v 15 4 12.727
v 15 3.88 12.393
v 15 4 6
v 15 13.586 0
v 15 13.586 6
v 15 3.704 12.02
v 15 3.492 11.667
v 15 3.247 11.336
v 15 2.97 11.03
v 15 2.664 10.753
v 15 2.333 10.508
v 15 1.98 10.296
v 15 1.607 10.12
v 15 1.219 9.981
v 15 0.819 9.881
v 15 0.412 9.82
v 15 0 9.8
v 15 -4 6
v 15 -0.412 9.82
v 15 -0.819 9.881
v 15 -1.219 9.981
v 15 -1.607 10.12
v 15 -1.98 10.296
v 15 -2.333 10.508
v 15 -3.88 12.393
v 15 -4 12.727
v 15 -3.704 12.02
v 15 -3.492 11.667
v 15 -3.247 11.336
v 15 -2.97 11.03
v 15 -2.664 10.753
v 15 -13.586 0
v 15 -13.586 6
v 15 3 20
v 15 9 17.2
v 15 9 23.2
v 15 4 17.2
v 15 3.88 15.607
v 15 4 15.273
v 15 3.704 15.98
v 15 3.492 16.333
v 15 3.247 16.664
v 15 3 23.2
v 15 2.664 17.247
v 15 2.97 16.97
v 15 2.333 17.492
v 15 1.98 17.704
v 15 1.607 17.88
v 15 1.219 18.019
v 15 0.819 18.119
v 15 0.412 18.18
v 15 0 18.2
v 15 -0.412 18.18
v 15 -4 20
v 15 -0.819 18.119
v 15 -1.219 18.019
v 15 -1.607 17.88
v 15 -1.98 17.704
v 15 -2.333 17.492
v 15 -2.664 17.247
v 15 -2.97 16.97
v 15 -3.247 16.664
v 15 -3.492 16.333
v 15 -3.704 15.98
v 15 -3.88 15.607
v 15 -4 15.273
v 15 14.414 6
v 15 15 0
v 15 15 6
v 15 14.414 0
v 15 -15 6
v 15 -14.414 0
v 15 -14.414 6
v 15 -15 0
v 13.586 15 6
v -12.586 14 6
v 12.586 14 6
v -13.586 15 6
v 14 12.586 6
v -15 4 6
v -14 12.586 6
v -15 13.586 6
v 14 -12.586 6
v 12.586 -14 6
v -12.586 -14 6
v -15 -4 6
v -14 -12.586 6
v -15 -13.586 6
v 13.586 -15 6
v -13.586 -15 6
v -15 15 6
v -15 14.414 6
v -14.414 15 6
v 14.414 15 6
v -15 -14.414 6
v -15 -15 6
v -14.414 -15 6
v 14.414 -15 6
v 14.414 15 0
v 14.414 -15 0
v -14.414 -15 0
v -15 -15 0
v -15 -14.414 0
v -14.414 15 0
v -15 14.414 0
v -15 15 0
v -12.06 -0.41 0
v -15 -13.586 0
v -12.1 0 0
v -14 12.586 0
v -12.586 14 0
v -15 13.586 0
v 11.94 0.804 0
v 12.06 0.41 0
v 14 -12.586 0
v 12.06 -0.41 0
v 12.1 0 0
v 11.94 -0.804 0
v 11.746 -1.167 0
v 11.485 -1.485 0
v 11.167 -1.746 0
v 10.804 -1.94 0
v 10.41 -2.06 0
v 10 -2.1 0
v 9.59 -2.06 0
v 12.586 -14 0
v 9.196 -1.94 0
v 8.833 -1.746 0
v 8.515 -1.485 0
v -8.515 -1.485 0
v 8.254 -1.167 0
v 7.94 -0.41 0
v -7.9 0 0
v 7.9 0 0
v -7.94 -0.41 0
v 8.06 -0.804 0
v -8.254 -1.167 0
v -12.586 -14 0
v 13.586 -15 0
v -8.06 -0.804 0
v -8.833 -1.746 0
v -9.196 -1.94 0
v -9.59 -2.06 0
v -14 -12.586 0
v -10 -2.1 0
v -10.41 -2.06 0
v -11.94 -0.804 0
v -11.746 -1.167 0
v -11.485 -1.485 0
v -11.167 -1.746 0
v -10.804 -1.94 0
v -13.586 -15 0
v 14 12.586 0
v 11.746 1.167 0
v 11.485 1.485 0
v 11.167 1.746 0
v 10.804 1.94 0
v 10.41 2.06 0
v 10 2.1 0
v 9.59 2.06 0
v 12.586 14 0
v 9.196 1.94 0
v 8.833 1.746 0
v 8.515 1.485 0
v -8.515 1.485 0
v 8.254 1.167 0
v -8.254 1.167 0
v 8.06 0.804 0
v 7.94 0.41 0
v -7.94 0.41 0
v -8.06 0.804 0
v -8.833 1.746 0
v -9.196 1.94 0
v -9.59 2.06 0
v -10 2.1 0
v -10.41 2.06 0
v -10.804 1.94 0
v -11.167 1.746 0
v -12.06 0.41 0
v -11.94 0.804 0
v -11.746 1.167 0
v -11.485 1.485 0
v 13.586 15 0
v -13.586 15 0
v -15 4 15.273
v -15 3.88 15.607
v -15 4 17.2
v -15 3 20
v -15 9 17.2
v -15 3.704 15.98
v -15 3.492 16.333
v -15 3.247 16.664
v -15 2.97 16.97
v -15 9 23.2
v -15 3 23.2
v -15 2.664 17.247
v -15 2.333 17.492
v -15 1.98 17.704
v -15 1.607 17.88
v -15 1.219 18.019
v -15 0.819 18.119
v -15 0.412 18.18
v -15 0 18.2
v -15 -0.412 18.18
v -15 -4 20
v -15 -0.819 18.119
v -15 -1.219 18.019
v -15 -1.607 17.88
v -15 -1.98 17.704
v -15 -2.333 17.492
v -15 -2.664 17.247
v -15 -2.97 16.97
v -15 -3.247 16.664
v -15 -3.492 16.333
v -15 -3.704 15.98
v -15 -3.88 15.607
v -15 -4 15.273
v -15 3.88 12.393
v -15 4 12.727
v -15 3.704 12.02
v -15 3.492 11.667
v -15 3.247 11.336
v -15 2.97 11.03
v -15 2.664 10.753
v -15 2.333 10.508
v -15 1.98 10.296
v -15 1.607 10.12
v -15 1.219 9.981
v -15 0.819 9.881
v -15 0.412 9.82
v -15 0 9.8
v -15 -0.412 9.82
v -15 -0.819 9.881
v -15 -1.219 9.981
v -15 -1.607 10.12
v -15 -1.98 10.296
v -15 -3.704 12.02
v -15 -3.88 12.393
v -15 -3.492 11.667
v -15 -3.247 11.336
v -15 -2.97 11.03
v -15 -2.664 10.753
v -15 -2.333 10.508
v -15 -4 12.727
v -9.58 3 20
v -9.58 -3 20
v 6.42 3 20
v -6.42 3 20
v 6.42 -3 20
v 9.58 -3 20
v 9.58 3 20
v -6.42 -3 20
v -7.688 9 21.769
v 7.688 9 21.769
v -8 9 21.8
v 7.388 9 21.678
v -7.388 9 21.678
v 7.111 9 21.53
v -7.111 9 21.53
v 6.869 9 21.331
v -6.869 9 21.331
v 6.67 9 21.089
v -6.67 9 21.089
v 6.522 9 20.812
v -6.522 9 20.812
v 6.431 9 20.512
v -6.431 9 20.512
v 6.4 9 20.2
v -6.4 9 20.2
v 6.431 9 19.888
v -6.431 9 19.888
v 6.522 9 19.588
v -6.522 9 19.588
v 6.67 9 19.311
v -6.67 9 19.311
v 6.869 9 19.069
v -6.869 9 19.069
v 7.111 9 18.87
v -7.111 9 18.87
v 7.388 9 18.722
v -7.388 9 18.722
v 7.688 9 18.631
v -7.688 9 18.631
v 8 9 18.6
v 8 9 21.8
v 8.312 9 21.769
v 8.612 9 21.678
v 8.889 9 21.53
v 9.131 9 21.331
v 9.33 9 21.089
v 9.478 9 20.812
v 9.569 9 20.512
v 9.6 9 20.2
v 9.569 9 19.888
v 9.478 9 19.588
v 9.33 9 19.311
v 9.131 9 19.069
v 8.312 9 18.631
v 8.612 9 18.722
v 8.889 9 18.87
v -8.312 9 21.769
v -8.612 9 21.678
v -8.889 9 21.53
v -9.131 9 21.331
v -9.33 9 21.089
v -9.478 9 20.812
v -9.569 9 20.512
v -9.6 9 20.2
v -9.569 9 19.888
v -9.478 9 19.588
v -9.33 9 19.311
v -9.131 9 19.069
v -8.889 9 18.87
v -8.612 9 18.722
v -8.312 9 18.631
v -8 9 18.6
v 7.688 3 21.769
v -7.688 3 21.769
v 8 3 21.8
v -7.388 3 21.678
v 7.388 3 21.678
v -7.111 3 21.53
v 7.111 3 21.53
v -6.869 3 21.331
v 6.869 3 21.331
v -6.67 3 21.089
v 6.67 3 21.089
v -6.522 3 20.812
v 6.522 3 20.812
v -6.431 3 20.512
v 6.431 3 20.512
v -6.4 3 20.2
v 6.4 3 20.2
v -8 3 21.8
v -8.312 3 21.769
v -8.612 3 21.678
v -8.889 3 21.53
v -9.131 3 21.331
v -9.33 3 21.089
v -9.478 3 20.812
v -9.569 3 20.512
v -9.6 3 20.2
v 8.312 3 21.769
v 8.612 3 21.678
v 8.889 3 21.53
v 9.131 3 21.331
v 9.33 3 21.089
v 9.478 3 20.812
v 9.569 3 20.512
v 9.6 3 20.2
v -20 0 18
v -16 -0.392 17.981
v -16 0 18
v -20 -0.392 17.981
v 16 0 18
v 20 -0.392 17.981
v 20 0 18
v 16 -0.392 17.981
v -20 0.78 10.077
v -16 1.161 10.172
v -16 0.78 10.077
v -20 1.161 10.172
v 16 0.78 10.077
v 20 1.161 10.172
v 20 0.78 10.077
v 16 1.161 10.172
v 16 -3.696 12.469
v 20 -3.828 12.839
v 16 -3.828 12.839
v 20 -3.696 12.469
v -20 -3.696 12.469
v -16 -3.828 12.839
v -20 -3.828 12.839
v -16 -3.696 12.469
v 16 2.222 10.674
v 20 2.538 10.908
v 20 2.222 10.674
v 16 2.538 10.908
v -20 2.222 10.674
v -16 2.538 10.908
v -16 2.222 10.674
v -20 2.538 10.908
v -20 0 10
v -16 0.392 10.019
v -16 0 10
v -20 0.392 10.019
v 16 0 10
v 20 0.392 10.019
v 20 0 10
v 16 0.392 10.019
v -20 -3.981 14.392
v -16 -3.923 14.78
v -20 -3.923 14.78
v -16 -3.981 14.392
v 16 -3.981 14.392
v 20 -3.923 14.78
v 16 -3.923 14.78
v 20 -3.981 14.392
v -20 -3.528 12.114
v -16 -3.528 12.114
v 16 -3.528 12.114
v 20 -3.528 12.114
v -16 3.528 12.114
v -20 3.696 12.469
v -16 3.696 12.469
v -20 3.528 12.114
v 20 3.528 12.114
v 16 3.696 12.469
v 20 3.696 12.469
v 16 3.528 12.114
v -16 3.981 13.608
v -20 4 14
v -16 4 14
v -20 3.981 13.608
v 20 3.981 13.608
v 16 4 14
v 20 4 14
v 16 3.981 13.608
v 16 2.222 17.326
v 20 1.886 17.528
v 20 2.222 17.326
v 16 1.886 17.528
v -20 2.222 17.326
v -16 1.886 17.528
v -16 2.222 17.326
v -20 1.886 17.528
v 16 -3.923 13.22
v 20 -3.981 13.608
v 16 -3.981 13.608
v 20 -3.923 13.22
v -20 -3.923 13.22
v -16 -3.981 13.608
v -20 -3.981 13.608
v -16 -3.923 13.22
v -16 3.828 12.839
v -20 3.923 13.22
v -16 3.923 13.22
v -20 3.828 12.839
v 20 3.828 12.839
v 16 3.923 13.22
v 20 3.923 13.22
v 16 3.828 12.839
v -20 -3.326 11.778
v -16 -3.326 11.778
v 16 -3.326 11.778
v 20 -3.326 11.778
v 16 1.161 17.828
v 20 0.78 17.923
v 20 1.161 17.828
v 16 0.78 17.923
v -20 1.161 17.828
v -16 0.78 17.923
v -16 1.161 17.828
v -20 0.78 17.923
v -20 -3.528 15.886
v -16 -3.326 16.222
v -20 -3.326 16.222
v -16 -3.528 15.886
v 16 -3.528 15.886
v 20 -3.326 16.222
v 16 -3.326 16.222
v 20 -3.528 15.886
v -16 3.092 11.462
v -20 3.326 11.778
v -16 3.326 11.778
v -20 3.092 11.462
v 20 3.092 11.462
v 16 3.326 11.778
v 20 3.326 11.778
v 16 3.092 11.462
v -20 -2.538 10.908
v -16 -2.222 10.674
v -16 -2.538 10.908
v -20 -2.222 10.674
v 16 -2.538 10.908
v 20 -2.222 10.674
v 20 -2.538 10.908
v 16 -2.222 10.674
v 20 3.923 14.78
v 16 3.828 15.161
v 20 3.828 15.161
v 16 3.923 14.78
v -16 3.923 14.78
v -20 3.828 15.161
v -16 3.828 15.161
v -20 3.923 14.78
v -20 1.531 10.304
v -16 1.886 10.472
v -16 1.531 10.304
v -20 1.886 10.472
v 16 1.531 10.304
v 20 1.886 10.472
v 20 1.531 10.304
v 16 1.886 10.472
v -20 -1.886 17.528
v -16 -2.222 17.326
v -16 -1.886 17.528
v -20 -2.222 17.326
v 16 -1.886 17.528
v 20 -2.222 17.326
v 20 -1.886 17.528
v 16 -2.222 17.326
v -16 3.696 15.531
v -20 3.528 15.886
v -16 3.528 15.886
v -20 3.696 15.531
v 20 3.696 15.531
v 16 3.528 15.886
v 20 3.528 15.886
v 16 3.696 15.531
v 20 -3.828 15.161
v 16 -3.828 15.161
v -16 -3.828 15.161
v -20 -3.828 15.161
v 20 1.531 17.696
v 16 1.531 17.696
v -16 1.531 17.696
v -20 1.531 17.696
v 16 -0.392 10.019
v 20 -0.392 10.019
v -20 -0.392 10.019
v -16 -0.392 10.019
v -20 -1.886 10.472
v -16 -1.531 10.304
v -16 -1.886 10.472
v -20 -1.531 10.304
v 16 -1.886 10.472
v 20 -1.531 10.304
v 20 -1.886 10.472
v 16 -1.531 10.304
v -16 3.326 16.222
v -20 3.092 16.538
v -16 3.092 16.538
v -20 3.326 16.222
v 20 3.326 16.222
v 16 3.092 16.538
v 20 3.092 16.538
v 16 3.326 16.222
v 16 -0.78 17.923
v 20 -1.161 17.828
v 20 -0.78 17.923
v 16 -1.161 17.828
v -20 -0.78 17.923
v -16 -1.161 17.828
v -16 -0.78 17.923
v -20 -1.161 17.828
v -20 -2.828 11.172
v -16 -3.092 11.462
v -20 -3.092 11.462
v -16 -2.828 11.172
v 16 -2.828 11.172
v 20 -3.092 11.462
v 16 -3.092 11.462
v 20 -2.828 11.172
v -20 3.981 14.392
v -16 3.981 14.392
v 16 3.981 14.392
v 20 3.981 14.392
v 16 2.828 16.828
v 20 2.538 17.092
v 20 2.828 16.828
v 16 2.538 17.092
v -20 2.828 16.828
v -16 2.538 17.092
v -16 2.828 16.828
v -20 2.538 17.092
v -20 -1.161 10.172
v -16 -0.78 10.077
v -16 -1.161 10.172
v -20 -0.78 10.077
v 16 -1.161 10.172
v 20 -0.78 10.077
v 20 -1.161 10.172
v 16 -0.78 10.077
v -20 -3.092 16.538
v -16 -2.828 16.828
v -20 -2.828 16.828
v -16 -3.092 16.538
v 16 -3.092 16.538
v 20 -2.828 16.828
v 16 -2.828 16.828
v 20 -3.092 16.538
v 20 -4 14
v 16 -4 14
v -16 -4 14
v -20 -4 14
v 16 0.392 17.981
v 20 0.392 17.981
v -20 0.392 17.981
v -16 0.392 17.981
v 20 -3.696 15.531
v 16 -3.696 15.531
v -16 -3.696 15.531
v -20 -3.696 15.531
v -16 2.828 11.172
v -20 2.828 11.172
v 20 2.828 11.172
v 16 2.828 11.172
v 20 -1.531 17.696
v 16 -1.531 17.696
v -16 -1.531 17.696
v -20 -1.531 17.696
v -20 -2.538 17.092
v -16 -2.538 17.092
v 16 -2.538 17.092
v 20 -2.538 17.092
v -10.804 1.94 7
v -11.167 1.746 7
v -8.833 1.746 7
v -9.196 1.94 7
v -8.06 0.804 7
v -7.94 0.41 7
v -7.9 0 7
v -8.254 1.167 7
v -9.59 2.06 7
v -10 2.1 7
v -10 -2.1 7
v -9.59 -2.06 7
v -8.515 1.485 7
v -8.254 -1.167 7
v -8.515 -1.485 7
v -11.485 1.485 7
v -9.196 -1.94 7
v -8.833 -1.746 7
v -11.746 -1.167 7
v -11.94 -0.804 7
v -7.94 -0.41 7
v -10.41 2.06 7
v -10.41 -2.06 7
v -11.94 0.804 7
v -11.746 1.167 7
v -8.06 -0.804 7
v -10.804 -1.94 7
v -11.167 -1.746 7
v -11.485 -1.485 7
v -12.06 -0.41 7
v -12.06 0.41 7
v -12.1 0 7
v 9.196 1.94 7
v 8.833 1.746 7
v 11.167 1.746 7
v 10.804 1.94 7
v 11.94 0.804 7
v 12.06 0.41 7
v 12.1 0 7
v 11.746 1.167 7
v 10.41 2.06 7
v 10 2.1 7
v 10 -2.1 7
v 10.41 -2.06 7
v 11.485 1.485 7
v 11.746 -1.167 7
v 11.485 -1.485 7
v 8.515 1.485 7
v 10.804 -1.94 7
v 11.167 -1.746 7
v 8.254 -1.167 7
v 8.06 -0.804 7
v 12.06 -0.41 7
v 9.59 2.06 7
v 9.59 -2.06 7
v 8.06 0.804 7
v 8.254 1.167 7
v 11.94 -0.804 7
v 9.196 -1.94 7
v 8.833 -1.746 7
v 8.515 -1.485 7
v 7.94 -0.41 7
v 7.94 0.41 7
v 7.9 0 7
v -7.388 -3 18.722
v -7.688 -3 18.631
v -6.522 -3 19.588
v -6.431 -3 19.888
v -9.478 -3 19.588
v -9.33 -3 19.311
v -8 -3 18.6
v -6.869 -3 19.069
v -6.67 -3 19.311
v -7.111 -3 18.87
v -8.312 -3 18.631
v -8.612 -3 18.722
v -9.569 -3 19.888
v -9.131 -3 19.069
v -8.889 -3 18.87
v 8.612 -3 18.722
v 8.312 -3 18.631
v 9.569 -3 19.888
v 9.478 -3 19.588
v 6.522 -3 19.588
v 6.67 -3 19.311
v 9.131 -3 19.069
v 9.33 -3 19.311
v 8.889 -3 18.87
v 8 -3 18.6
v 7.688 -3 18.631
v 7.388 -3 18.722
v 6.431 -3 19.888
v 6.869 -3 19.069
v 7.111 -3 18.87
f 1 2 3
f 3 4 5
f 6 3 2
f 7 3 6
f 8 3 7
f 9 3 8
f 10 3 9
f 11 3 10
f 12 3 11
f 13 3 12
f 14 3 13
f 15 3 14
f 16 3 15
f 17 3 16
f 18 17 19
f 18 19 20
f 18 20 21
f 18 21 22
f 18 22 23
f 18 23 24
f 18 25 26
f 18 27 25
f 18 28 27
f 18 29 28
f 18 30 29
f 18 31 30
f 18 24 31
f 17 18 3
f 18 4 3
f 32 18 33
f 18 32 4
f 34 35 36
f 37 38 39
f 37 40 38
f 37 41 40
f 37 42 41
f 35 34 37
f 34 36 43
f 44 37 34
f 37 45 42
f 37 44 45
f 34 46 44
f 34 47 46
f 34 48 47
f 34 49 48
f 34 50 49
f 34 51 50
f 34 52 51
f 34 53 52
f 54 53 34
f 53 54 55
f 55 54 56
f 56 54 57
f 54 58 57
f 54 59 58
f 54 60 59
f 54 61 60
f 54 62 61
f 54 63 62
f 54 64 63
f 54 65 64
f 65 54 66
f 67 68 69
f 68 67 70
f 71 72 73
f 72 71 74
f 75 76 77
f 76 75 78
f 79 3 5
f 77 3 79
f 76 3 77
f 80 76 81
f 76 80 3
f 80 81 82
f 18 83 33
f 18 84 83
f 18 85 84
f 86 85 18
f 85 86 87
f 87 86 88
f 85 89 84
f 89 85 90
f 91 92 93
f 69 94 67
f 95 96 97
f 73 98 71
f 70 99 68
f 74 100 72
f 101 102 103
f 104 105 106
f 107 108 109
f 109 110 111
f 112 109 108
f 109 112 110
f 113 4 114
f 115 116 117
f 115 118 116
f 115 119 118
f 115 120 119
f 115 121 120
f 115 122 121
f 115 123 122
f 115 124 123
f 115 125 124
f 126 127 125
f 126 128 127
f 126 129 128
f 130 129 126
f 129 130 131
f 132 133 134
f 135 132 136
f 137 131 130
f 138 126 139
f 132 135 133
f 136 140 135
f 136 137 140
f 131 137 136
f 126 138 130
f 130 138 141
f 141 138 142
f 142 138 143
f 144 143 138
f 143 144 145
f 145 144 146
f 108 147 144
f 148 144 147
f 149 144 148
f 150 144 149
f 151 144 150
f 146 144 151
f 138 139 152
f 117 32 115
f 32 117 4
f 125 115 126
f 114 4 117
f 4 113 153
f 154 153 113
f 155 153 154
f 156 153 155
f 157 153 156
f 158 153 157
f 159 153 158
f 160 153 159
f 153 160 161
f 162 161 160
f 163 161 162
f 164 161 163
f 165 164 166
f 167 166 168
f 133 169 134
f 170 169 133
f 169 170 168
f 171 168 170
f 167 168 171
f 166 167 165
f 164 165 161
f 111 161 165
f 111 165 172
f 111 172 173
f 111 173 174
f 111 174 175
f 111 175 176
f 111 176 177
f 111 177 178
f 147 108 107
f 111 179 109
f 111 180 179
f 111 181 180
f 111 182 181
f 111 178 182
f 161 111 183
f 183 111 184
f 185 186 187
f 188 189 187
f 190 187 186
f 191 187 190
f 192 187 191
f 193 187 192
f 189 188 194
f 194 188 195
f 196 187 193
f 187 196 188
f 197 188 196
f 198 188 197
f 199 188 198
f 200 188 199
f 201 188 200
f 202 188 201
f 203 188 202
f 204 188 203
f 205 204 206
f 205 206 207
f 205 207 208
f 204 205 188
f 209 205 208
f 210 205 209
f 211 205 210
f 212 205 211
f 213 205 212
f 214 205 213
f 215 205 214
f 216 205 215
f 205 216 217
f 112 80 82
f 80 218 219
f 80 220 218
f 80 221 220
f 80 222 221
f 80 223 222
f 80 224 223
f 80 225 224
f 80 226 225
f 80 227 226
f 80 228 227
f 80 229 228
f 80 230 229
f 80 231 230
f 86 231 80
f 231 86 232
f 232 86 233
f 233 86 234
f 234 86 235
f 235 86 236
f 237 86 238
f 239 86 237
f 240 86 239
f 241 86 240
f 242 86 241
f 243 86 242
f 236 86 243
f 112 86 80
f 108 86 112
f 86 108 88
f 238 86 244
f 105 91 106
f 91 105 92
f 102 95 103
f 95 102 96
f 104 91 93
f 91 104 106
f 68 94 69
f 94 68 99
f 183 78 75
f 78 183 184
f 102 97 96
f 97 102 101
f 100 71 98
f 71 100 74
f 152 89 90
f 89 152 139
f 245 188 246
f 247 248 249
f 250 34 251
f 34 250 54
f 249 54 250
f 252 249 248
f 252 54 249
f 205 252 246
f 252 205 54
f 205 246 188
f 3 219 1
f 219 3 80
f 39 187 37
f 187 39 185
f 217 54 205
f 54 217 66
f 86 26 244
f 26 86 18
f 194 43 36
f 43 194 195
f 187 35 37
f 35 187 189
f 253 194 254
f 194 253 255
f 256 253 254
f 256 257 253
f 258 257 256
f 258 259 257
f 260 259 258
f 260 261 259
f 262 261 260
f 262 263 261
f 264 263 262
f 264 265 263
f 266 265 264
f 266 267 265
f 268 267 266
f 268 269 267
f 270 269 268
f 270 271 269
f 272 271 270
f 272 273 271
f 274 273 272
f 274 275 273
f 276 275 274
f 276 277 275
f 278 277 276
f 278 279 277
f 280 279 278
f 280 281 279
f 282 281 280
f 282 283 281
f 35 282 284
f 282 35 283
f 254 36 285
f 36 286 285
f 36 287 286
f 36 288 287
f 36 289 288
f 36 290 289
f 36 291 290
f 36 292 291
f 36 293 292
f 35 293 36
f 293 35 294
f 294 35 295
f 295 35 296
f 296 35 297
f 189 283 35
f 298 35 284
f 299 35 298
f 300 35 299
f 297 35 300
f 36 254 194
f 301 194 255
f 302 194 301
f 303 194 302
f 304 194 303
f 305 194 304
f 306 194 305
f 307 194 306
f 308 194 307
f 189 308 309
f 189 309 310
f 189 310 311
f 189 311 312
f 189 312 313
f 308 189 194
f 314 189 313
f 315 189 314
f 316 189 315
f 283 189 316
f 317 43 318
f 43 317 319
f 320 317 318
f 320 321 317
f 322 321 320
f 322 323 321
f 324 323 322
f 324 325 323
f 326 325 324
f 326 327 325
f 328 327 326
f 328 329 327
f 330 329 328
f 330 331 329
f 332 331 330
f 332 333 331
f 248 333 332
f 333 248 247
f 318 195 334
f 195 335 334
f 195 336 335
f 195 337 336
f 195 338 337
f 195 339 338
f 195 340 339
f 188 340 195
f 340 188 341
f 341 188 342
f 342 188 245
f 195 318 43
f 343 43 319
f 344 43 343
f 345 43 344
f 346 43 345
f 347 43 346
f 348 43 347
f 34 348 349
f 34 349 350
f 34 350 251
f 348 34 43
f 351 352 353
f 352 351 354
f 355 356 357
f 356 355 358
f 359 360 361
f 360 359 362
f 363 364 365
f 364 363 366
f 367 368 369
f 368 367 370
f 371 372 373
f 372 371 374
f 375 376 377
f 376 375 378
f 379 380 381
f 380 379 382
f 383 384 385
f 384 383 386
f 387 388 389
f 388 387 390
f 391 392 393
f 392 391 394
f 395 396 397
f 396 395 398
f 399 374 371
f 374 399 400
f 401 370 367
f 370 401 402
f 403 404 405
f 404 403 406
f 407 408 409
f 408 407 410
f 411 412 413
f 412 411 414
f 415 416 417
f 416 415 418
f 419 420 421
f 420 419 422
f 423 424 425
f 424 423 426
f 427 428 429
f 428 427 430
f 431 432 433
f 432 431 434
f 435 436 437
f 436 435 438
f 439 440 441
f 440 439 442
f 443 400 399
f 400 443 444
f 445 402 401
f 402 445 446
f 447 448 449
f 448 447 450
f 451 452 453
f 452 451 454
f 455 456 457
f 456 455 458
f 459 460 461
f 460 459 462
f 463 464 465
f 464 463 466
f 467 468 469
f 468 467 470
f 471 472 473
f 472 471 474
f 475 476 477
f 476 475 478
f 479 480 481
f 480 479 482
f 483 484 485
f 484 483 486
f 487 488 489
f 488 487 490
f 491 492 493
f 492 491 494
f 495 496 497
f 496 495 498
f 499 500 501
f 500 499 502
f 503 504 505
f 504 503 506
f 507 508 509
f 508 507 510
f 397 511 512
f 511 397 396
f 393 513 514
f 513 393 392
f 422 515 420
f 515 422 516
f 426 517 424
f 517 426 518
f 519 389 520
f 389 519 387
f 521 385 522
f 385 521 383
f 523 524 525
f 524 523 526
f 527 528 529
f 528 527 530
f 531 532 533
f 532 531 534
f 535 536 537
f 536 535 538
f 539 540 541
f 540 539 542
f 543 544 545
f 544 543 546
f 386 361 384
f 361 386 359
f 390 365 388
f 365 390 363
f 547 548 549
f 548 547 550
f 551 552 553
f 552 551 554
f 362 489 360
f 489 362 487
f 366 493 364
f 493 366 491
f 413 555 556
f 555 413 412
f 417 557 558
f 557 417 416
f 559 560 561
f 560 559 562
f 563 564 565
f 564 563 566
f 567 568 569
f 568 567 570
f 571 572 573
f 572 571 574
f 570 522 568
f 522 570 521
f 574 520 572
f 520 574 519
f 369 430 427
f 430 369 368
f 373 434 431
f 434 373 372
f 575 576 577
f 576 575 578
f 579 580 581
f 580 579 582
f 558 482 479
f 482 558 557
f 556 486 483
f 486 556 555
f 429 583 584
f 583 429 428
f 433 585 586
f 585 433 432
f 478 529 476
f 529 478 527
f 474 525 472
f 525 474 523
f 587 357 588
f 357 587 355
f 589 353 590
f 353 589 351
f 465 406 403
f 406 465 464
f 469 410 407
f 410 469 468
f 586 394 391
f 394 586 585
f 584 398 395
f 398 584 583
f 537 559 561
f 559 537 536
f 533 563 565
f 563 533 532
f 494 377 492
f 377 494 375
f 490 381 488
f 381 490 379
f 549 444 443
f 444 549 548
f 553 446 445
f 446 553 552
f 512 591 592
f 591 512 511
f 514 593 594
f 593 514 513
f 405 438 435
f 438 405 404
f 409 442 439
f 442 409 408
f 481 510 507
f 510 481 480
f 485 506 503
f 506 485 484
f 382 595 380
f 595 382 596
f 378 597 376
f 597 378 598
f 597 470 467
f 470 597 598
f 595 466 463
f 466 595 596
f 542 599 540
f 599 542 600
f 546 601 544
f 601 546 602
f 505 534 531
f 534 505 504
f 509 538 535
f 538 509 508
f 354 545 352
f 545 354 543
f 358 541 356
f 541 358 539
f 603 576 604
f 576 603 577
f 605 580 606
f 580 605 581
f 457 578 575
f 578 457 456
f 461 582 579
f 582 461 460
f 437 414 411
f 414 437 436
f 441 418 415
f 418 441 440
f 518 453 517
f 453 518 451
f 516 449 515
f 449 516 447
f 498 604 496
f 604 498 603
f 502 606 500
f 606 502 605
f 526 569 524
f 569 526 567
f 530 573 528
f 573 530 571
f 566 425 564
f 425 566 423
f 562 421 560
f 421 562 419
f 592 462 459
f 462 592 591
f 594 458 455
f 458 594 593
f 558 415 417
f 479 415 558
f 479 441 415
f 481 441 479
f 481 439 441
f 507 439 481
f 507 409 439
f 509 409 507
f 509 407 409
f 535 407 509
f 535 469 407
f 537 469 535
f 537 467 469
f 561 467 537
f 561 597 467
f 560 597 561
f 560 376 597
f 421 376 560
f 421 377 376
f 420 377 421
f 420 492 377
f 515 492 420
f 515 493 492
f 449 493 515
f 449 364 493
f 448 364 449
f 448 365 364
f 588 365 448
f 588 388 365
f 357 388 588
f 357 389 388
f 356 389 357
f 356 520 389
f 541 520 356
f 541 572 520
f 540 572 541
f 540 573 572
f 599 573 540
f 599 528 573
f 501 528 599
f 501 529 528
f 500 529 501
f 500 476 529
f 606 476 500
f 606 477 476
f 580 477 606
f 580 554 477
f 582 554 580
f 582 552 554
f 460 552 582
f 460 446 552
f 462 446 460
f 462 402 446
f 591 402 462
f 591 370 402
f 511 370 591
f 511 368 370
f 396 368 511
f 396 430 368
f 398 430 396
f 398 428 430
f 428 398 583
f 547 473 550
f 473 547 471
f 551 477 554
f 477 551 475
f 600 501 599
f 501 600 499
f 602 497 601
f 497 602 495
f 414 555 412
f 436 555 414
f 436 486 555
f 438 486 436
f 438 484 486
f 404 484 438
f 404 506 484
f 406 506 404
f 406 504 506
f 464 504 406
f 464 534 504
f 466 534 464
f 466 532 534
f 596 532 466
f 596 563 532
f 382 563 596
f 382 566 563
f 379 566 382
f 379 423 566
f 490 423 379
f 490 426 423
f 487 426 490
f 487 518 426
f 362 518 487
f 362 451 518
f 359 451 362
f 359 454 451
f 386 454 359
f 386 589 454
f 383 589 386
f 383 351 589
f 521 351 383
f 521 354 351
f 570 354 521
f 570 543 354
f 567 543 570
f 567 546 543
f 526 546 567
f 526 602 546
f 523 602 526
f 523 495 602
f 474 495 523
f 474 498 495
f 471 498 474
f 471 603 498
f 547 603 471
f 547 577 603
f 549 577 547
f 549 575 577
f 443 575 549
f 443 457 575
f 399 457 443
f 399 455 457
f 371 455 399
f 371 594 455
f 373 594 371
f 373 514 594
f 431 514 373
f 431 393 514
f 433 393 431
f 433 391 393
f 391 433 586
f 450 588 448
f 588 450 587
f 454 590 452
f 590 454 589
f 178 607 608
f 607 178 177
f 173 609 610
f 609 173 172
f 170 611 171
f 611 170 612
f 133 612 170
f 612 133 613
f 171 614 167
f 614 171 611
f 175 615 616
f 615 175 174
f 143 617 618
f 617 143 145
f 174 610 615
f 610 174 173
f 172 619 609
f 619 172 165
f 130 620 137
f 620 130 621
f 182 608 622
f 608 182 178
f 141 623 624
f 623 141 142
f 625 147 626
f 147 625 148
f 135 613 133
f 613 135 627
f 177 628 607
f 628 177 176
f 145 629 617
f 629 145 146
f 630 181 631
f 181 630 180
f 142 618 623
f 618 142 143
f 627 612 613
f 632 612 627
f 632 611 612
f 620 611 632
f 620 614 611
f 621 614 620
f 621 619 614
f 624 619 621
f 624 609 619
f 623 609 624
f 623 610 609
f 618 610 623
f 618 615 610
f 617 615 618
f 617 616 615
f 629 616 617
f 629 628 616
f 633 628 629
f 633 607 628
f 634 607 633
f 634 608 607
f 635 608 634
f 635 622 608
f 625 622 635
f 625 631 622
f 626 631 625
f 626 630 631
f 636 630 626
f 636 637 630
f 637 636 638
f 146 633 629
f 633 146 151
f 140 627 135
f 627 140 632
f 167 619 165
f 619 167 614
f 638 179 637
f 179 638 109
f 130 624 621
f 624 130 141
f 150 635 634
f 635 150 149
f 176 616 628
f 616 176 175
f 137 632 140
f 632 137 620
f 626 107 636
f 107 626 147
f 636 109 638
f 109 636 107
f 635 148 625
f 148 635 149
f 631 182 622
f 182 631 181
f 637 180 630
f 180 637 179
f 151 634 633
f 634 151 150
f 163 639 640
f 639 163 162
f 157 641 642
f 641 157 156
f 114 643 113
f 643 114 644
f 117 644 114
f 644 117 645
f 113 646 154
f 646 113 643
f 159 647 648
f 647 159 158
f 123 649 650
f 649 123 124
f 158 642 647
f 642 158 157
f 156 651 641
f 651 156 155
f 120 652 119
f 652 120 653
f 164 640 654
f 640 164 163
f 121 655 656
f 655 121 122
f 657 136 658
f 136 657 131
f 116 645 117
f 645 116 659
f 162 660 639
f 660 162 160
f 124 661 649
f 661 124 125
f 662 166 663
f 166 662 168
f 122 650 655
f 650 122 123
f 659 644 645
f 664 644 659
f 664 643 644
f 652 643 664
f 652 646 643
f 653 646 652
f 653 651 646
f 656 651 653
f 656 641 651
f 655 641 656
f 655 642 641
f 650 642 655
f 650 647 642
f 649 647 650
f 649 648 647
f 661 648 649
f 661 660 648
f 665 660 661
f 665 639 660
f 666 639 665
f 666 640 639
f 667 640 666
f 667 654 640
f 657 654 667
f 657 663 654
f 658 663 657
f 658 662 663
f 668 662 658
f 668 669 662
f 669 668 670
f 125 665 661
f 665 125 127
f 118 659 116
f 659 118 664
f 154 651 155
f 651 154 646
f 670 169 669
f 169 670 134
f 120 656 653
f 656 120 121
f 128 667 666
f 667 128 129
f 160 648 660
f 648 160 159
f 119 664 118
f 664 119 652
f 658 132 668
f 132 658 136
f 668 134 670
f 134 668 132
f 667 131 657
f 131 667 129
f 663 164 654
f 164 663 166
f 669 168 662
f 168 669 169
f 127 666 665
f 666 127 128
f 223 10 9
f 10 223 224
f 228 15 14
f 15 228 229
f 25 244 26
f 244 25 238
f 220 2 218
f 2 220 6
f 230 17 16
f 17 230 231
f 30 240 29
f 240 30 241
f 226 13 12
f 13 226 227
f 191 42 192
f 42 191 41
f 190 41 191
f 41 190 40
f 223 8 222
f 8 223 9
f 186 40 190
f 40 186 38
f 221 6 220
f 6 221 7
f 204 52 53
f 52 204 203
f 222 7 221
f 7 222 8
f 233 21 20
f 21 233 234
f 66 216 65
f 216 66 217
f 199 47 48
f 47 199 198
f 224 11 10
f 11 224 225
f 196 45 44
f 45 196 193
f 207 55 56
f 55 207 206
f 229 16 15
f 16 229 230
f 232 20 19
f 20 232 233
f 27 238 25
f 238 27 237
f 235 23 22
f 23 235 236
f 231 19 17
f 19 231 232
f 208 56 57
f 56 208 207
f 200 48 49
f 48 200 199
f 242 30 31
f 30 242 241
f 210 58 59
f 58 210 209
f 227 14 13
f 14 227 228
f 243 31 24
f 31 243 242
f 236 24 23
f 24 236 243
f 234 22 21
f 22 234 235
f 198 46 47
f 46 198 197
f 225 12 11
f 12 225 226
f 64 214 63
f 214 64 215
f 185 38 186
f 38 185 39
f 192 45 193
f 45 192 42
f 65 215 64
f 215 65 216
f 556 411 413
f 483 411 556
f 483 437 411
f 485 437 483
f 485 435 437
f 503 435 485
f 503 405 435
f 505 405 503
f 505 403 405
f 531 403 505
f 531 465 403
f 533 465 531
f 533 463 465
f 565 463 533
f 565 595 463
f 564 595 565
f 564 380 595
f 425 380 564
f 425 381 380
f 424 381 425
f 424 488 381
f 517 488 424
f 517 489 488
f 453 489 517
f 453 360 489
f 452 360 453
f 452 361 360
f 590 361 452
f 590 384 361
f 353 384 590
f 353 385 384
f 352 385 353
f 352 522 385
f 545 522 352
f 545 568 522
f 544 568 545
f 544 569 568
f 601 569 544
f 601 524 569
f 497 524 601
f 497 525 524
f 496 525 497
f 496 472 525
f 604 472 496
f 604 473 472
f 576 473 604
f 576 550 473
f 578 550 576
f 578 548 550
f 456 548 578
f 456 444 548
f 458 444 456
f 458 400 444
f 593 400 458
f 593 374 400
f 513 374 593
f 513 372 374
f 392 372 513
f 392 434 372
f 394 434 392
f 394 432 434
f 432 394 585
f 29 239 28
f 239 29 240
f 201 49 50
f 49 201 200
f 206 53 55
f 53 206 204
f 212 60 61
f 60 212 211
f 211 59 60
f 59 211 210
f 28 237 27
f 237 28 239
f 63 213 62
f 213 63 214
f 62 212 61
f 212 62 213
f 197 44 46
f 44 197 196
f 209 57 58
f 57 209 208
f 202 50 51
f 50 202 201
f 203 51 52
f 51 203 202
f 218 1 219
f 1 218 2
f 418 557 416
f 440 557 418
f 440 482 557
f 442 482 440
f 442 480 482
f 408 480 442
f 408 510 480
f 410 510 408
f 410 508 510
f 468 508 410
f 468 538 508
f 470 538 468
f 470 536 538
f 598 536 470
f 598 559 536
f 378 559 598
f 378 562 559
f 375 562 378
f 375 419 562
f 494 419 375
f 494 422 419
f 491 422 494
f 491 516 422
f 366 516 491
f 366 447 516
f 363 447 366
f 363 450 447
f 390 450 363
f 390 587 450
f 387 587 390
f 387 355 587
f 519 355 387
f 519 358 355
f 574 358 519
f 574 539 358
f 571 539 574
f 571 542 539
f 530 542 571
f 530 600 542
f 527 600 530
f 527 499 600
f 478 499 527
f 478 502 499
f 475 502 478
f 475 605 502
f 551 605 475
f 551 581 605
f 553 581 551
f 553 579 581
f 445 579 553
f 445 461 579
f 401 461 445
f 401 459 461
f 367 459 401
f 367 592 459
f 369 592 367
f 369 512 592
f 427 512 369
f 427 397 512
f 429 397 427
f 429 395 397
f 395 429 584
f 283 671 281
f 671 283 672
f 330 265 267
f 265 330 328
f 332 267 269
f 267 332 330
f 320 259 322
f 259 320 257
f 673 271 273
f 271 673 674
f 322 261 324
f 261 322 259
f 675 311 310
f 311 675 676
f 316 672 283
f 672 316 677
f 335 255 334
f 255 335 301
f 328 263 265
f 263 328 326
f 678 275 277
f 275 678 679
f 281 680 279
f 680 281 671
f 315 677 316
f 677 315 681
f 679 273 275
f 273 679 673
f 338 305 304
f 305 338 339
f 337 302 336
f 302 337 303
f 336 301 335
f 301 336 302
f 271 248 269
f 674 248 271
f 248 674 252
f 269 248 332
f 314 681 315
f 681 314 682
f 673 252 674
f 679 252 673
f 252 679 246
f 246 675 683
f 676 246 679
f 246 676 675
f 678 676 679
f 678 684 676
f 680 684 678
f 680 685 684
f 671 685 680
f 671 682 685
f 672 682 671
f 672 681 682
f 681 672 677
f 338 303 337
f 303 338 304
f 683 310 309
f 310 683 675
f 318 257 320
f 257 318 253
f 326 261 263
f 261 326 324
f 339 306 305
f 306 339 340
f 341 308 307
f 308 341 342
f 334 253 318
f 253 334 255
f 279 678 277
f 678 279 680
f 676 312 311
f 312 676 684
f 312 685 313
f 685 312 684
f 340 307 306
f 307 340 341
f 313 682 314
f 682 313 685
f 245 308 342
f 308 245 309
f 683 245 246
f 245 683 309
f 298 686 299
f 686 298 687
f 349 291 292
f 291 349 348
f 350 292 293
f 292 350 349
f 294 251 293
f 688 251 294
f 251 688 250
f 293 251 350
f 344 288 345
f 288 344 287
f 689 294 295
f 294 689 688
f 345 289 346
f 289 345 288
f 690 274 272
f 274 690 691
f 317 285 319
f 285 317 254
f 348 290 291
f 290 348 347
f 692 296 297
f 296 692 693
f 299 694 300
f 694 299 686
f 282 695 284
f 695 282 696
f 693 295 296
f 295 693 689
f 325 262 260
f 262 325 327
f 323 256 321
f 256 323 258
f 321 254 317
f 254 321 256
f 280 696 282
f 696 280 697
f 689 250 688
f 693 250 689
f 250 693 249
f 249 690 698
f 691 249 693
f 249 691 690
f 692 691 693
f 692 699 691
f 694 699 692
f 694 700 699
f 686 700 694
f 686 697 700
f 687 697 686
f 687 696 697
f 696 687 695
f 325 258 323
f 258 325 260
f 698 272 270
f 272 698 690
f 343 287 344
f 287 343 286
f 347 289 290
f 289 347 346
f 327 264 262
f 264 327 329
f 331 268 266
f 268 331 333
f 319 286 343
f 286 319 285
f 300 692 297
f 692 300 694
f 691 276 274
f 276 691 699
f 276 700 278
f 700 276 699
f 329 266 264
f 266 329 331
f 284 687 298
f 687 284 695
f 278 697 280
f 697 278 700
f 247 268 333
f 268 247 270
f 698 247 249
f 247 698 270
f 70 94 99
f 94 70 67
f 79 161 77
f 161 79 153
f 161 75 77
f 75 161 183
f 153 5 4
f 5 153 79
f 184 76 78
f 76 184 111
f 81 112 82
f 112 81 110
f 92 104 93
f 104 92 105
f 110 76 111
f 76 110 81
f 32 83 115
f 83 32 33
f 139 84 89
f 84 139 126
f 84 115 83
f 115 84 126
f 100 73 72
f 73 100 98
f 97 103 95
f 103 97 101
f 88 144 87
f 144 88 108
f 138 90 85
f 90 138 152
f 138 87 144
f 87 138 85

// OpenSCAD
// Parameters
rod_diameter = 8.0; //[4.0:16.0:0.1]
overall_height = 20.0; //[10.0:40.0:0.5]
base_width = 30.0; //[15.0:60.0:0.5]
base_length = 30.0; //[15.0:60.0:0.5]
base_thickness = 6.0; //[3.0:12.0:0.2]
upright_thickness = 8.0; //[4.0:16.0:0.2]
rod_center_height = 14.0; //[8.0:30.0:0.2]
rod_clearance = 0.2; //[0.0:0.6:0.05]
mount_hole_diameter = 4.2; //[3.0:6.5:0.1]
mount_hole_spacing = 20.0; //[12.0:40.0:0.5]
clamp_screw_diameter = 3.2; //[2.5:5.0:0.1]
clamp_screw_spacing = 16.0; //[10.0:30.0:0.5]
edge_chamfer = 1.0; //[0.0:3.0:0.1]
overlap = 1.0; //[0.5:2.0:0.1]
clamp_cap_thickness = 6.0; //[3.0:12.0:0.2]
clamp_cap_height = 6.0; //[3.0:12.0:0.2]
rod_length = 40.0; //[20.0:120.0:1]
rod_web_thickness = 0.8; //[0.4:2.0:0.1]

// Rod - complete geometry
module rod() {
  color("Silver") {
    cylinder(r=rod_diameter/2, h=rod_length, center=true, $fn=64);
  }
}

// Bracket - complete geometry
module bracket() {
  color("Silver") difference() {
    union() {
      // Base block
      translate([0, 0, base_thickness/2])
        cube([base_width, base_length, base_thickness], center=true);
      
      // Support upright
      translate([0, 0, base_thickness + (overall_height - base_thickness)/2])
        cube([base_width, upright_thickness, overall_height - base_thickness], center=true);
      
      // Clamp cap or retainer
      translate([0, (upright_thickness/2 + clamp_cap_thickness/2 - overlap), 
                 rod_center_height + (rod_diameter + 2*rod_clearance)/2 + clamp_cap_height/2 - overlap])
        cube([base_width, clamp_cap_thickness, clamp_cap_height], center=true);
      
      // Rod connect web
      translate([0, 0, rod_center_height - (rod_diameter/4)])
        cube([rod_web_thickness, upright_thickness, (rod_diameter/2) + overlap], center=true);
      
      // Rod
      translate([0, 0, rod_center_height])
        rotate([0, 90, 0]) rod();
    }
    
    // Mounting holes
    translate([-mount_hole_spacing/2, 0, base_thickness/2])
      cylinder(r=mount_hole_diameter/2, h=base_thickness + 2*overlap, center=true, $fn=32);
    translate([mount_hole_spacing/2, 0, base_thickness/2])
      cylinder(r=mount_hole_diameter/2, h=base_thickness + 2*overlap, center=true, $fn=32);
    
    // Rod saddle bore
    translate([0, 0, rod_center_height])
      rotate([0, 90, 0])
      cylinder(r=(rod_diameter + 2*rod_clearance)/2, h=base_width + 2*overlap, center=true, $fn=64);
    
    // Fastener clearance holes
    translate([-clamp_screw_spacing/2, upright_thickness/2 + clamp_cap_thickness/2 - overlap, 
               rod_center_height + (rod_diameter + 2*rod_clearance)/2 + clamp_cap_height/2 - overlap])
      rotate([90, 0, 0])
      cylinder(r=clamp_screw_diameter/2, h=upright_thickness + clamp_cap_thickness + 4*overlap, center=true, $fn=32);
    translate([clamp_screw_spacing/2, upright_thickness/2 + clamp_cap_thickness/2 - overlap, 
               rod_center_height + (rod_diameter + 2*rod_clearance)/2 + clamp_cap_height/2 - overlap])
      rotate([90, 0, 0])
      cylinder(r=clamp_screw_diameter/2, h=upright_thickness + clamp_cap_thickness + 4*overlap, center=true, $fn=32);
    
    // Chamfer cuts
    translate([base_width/2 - edge_chamfer, base_length/2 - edge_chamfer, base_thickness/2])
      rotate([0, 0, 45])
      cube([edge_chamfer*2, edge_chamfer*2, base_thickness + 2*overlap], center=true);
    translate([-base_width/2 + edge_chamfer, base_length/2 - edge_chamfer, base_thickness/2])
      rotate([0, 0, 45])
      cube([edge_chamfer*2, edge_chamfer*2, base_thickness + 2*overlap], center=true);
    translate([base_width/2 - edge_chamfer, -base_length/2 + edge_chamfer, base_thickness/2])
      rotate([0, 0, 45])
      cube([edge_chamfer*2, edge_chamfer*2, base_thickness + 2*overlap], center=true);
    translate([-base_width/2 + edge_chamfer, -base_length/2 + edge_chamfer, base_thickness/2])
      rotate([0, 0, 45])
      cube([edge_chamfer*2, edge_chamfer*2, base_thickness + 2*overlap], center=true);
  }
}

// Assembly
module assembly() {
  bracket();
}

assembly();
